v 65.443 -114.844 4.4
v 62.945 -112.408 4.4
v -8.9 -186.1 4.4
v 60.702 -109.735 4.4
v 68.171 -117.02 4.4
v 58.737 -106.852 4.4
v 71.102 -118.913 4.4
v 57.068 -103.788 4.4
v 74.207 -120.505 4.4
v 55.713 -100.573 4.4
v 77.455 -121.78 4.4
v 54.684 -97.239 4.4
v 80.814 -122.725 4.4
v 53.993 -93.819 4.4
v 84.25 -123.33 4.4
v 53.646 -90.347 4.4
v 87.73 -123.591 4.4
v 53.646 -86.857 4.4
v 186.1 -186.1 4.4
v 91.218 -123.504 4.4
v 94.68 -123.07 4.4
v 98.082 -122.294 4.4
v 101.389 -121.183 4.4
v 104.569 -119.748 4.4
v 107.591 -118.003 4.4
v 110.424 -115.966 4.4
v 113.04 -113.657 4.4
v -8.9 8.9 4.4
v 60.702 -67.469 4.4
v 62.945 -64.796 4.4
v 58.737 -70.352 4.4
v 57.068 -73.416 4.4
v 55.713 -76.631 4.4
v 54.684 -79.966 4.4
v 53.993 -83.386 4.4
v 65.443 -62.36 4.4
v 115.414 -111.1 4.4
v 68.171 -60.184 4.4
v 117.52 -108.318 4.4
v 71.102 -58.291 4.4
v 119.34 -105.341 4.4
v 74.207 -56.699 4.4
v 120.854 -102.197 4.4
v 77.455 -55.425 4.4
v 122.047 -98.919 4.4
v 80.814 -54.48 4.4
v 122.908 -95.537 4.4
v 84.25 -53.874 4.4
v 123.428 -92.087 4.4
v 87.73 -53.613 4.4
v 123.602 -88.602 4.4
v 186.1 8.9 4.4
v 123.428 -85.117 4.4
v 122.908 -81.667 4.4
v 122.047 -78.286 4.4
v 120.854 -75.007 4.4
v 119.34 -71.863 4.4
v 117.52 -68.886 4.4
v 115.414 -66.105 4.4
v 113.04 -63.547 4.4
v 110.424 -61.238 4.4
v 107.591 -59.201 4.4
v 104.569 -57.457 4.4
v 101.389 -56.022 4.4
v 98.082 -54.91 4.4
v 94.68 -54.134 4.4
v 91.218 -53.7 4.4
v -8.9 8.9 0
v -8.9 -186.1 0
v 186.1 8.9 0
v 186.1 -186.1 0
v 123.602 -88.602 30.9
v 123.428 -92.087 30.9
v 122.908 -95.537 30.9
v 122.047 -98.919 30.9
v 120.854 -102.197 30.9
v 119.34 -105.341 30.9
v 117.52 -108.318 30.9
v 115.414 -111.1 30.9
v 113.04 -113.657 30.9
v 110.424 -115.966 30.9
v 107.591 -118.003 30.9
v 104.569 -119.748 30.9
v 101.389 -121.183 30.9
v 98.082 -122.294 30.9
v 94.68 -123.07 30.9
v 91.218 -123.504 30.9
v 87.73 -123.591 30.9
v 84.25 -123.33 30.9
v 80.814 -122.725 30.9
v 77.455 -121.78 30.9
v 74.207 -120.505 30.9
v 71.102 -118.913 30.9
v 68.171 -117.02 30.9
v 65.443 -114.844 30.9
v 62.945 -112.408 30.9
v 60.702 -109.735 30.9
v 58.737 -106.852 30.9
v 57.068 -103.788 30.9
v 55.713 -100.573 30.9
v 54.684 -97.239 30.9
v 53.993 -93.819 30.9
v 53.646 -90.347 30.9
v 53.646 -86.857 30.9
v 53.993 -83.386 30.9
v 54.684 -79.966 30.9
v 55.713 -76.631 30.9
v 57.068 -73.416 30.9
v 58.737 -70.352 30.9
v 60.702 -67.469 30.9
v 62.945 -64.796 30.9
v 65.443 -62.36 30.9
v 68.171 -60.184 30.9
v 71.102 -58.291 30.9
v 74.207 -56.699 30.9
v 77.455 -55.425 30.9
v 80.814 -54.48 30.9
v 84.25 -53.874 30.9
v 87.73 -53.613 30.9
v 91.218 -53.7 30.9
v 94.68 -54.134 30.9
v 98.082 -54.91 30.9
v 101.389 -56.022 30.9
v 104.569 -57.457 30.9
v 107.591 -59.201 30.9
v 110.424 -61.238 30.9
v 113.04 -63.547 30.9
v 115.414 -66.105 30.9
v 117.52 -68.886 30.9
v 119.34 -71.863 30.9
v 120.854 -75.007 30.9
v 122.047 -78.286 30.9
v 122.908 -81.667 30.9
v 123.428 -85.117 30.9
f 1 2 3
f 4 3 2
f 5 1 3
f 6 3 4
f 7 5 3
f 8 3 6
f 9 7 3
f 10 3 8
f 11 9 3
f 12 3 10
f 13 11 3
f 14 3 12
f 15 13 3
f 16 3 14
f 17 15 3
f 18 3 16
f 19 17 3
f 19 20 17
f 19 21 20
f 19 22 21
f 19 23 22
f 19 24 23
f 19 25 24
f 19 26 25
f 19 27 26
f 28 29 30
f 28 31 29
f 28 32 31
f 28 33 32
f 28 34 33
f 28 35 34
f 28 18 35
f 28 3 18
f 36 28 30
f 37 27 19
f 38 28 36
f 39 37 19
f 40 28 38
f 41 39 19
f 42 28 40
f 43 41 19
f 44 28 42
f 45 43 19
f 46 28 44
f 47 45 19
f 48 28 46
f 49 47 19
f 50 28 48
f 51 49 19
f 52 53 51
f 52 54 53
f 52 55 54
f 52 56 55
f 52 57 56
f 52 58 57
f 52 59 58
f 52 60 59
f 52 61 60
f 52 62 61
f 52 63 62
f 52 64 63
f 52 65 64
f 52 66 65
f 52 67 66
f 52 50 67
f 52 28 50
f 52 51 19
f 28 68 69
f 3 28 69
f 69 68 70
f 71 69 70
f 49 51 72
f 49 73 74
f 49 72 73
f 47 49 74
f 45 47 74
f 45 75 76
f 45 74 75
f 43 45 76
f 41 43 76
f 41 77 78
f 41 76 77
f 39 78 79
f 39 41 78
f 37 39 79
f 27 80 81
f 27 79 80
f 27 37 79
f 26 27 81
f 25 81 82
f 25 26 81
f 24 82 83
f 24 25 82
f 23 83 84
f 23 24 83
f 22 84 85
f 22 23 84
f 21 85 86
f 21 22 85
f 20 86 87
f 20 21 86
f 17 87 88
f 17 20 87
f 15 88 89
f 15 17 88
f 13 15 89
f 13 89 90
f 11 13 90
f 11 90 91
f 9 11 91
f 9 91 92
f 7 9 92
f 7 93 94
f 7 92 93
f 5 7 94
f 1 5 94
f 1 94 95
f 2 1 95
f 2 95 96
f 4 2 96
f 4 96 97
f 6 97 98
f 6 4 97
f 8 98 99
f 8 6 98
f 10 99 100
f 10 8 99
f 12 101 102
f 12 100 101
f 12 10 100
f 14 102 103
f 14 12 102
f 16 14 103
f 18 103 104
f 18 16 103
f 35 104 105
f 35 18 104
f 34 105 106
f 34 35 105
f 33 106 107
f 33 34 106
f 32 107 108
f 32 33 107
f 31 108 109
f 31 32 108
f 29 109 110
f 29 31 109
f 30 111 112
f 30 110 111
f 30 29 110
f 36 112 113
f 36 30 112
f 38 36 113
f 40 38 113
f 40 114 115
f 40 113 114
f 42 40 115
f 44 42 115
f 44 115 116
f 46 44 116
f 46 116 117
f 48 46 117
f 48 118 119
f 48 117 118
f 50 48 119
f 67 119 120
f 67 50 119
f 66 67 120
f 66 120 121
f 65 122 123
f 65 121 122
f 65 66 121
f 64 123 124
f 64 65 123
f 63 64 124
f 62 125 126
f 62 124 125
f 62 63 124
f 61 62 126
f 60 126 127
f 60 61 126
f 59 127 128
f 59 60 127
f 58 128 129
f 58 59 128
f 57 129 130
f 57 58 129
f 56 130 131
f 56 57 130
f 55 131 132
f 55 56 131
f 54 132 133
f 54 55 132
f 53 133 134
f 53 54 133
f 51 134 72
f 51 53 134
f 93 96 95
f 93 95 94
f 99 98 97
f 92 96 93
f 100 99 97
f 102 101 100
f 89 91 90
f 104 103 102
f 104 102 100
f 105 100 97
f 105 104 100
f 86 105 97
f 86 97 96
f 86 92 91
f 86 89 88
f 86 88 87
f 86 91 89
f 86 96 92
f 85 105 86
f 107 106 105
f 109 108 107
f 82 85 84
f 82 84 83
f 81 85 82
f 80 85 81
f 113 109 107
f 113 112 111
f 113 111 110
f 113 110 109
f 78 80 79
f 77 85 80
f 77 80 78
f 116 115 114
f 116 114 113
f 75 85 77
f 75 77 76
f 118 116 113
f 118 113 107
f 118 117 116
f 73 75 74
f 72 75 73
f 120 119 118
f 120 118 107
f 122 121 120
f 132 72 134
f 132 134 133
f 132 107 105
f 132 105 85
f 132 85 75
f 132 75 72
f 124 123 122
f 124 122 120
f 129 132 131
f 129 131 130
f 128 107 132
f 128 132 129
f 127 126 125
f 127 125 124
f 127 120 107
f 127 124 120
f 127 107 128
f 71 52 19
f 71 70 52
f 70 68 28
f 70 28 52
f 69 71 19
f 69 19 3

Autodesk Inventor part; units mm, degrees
ref_plane "YZ Plane" through (0, 0, 0) normal (1, 0, 0) x (0, 1, 0)
ref_plane "XZ Plane" through (0, 0, 0) normal (0, 1, 0) x (-1, 0, 0)
ref_plane "XY Plane" through (0, 0, 0) normal (0, 0, 1) x (1, 0, 0)
sketch "Boceto1" plane through (0, 0, 0) normal (0, 0, 1) x (1, 0, 0)
  line L0 (186.1, 8.9) -> (186.1, -186.1) projected
  line L1 (-8.9, 8.9) -> (-8.9, -186.1) projected
  line L2 (186.1, -186.1) -> (-8.9, -186.1)
  line L3 (-8.9, 8.9) -> (186.1, 8.9)
  point P0 (0, 0)
extrude "Extrusión1" add sketch "Boceto1" along normal blind 4.4
sketch "Boceto2" plane through (0, 0, 4.4) normal (0, 0, 1) x (1, 0, 0)
  line L0 (186.1, -186.1) -> (186.1, 8.9) projected
  line L1 (-8.9, -186.1) -> (186.1, -186.1) projected
  line L2 (-8.9, 8.9) -> (-8.9, -186.1) projected
  line L3 (186.1, 8.9) -> (-8.9, 8.9) projected
  circle A0 centre (88.6021, -88.6021) radius 35
  point P0 (0, 0)
  dimension "d2" = 70
  dimension "d3" = 97.4979
  dimension "d4" = 97.4979
extrude "Extrusión2" add sketch "Boceto2" along normal blind 26.5 contours A0
properties part number "Acrilico_Top"
